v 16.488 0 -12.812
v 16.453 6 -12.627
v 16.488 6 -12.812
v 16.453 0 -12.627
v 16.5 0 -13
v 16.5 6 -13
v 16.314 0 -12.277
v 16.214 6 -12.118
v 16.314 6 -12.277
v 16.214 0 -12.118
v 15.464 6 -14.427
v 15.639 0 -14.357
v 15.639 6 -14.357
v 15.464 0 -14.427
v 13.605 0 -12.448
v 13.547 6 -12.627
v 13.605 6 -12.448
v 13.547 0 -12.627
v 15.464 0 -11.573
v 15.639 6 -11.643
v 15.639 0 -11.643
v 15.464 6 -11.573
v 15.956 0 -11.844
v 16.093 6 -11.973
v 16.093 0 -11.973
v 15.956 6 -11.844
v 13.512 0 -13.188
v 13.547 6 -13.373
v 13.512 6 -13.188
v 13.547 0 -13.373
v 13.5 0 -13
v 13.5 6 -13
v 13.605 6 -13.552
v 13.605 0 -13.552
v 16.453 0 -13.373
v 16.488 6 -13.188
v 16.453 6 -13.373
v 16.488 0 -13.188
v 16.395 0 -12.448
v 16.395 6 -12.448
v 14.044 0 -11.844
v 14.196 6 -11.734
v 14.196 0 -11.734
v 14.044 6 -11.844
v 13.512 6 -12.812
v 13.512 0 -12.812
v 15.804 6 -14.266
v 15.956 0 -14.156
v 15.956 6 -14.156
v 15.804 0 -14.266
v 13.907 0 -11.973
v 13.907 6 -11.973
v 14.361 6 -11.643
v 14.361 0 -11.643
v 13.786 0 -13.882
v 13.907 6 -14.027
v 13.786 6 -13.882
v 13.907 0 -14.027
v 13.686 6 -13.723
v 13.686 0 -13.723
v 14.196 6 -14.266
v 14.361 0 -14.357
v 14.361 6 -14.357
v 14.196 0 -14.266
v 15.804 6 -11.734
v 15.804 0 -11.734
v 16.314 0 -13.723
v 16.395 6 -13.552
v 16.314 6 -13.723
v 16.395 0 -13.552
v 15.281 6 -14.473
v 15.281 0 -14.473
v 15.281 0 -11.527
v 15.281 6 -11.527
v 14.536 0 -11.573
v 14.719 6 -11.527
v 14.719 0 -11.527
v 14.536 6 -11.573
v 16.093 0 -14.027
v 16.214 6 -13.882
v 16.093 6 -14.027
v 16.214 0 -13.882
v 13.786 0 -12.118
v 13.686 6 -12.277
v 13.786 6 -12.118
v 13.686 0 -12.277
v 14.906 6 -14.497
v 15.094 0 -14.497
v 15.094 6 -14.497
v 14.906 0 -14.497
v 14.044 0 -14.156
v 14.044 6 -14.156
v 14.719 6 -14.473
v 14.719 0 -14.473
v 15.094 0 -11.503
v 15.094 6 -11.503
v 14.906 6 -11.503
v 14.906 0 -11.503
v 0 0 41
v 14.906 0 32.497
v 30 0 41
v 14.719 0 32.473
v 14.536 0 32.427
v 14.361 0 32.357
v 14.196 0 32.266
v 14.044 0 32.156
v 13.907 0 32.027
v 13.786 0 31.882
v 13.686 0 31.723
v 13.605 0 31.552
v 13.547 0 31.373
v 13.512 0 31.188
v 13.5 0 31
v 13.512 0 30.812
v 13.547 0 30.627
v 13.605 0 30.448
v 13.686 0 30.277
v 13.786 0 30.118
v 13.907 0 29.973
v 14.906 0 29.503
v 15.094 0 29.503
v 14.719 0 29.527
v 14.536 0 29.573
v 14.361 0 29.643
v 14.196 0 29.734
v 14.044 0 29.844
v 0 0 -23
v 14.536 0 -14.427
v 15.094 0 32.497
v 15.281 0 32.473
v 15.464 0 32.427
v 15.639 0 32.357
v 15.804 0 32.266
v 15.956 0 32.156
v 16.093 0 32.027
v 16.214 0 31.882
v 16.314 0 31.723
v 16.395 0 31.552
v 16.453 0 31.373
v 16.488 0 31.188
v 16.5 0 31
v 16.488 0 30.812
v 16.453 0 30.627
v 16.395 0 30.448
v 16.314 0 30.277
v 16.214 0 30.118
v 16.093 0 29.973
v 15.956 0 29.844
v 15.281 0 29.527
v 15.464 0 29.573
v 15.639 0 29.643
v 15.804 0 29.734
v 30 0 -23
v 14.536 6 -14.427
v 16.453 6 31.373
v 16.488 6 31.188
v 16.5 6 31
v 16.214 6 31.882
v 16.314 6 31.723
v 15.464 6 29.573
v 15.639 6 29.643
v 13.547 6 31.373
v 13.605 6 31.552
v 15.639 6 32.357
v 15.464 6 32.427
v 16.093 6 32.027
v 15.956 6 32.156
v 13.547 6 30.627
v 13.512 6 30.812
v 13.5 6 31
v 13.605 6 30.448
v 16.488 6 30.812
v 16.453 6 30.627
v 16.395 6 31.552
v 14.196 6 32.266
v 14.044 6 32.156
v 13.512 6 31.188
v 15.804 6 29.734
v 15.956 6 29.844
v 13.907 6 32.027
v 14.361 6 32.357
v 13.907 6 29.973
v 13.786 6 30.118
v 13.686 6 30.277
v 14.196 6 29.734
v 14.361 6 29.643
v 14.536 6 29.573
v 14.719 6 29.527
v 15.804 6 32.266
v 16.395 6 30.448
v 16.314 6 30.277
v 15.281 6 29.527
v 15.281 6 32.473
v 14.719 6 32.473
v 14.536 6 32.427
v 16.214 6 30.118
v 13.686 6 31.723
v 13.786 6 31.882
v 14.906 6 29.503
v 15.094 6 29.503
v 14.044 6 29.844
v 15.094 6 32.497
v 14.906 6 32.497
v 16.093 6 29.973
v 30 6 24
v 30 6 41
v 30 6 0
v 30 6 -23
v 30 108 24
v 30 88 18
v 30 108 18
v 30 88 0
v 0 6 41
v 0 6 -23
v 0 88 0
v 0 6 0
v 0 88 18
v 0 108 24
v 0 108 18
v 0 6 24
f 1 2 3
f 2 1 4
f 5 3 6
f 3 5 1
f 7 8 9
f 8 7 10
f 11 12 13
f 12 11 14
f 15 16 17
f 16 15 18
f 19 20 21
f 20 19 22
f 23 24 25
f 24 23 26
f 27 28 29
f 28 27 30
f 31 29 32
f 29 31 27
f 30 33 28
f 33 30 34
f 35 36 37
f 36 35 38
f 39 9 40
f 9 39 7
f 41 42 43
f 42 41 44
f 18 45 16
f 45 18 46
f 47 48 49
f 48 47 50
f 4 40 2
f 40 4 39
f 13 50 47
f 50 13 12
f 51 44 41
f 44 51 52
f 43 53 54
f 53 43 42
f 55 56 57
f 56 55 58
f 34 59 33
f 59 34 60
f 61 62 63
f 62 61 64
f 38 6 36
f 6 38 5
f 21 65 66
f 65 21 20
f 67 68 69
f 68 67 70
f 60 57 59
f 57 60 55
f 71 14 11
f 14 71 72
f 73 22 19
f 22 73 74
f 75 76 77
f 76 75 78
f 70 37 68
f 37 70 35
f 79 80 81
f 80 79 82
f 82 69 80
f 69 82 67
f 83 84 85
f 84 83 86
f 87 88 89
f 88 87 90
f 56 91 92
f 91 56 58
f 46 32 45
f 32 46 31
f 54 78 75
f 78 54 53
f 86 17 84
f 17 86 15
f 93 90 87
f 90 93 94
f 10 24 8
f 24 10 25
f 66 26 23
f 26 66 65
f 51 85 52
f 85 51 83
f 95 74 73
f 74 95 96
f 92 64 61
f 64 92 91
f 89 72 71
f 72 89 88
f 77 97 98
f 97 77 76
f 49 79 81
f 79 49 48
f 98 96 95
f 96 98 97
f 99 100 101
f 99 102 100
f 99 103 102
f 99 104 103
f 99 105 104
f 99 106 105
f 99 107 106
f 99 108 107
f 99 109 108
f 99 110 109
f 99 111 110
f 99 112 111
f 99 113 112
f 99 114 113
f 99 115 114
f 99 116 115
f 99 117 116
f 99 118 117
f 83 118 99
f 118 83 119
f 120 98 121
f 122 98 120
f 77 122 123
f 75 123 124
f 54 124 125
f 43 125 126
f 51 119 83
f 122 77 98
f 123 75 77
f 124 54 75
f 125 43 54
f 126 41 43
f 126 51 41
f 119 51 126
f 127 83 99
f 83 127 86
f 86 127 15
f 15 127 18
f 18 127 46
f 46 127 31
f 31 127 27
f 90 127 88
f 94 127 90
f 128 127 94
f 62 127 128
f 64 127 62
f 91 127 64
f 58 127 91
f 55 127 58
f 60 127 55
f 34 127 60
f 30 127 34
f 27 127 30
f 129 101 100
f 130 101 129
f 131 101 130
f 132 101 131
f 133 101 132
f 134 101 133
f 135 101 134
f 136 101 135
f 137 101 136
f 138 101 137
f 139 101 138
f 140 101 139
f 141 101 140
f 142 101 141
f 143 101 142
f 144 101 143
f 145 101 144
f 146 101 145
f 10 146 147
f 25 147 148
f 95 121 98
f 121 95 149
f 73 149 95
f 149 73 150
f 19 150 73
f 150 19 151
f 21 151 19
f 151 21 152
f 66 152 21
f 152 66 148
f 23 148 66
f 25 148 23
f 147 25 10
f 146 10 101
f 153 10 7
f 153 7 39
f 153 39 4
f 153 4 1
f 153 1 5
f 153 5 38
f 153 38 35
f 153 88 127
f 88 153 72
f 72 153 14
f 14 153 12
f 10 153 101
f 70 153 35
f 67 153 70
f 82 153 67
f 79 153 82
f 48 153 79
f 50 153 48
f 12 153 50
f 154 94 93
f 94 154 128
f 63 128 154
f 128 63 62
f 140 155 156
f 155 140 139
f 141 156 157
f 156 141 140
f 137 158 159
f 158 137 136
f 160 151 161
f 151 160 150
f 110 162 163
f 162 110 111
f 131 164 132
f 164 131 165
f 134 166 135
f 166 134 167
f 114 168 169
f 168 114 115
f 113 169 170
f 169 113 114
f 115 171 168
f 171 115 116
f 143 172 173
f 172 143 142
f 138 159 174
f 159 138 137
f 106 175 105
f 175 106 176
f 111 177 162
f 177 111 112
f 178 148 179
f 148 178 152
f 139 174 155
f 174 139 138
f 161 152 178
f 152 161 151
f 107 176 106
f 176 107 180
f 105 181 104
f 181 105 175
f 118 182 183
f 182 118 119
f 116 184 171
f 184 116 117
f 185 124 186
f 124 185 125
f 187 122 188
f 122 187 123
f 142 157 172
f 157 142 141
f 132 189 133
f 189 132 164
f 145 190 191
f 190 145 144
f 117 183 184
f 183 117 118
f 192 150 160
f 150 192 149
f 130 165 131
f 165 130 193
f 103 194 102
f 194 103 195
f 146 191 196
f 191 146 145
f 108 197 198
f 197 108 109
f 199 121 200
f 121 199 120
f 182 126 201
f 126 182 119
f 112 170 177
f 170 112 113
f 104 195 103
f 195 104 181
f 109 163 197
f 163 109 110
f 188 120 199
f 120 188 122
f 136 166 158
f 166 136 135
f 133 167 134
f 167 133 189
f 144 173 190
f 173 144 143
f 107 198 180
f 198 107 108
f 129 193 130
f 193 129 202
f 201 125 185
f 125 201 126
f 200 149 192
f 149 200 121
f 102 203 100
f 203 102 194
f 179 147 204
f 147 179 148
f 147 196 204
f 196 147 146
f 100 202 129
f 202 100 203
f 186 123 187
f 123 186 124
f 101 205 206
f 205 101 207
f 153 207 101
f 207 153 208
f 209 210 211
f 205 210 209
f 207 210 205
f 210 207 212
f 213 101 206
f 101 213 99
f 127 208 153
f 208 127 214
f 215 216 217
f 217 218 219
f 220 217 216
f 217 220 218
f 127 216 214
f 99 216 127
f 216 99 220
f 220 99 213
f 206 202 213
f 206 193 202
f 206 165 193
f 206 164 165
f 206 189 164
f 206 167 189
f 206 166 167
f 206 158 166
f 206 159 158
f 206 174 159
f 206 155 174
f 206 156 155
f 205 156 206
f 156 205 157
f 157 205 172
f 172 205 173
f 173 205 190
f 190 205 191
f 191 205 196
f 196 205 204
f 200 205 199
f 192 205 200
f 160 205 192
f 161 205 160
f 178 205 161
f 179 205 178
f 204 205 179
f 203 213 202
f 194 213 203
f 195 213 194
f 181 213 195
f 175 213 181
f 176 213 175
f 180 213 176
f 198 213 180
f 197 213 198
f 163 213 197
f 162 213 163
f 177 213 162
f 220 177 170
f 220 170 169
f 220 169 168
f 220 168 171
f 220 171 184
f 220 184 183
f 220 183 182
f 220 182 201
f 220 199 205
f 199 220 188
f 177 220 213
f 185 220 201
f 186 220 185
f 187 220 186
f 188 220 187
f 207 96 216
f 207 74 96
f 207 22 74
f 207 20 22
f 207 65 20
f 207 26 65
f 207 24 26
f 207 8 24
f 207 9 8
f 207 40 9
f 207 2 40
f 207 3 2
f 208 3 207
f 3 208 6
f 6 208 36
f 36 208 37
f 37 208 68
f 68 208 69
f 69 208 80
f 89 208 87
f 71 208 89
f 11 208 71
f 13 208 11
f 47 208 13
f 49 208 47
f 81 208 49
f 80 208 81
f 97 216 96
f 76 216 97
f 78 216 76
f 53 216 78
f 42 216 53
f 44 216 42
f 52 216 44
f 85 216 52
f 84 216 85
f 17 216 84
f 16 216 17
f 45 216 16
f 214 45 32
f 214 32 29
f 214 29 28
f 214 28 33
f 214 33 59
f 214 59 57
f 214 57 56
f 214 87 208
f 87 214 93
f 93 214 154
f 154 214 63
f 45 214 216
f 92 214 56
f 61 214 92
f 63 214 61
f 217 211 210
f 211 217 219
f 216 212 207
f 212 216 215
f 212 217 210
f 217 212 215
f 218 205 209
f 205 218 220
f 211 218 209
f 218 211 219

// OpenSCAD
/*
 * Wardrobe shelf brace
 * (c) 2020 David Mikulik
 * Licensed under 
 *   Creative Commons 
 *   Attribution Non Comercial Share alike license
 */
 
THIKNES=6;

WIDTH=30;
LENGHT=88;
HEIGTH=18;
SCREWS=3;
LAP=20;
$fn=50;
cube ([WIDTH,LENGHT, HEIGTH]);
translate([0,0,-LAP-THIKNES/2]) {
    difference () {    
        cube ([WIDTH,THIKNES, THIKNES+HEIGTH+LAP*2]);
        rotate ([90,0,0]) {
            translate([WIDTH/2,LAP/2,-THIKNES*2]) {
                cylinder(h=THIKNES*2, d=SCREWS);
            }
            translate([WIDTH/2,LAP*1.5+HEIGTH+THIKNES,-THIKNES*2]) {
                cylinder(h=THIKNES*2, d=SCREWS);
            }
        }
    }
}
translate([0,0,HEIGTH]) {
    cube ([WIDTH,LENGHT+LAP, THIKNES]);
}
